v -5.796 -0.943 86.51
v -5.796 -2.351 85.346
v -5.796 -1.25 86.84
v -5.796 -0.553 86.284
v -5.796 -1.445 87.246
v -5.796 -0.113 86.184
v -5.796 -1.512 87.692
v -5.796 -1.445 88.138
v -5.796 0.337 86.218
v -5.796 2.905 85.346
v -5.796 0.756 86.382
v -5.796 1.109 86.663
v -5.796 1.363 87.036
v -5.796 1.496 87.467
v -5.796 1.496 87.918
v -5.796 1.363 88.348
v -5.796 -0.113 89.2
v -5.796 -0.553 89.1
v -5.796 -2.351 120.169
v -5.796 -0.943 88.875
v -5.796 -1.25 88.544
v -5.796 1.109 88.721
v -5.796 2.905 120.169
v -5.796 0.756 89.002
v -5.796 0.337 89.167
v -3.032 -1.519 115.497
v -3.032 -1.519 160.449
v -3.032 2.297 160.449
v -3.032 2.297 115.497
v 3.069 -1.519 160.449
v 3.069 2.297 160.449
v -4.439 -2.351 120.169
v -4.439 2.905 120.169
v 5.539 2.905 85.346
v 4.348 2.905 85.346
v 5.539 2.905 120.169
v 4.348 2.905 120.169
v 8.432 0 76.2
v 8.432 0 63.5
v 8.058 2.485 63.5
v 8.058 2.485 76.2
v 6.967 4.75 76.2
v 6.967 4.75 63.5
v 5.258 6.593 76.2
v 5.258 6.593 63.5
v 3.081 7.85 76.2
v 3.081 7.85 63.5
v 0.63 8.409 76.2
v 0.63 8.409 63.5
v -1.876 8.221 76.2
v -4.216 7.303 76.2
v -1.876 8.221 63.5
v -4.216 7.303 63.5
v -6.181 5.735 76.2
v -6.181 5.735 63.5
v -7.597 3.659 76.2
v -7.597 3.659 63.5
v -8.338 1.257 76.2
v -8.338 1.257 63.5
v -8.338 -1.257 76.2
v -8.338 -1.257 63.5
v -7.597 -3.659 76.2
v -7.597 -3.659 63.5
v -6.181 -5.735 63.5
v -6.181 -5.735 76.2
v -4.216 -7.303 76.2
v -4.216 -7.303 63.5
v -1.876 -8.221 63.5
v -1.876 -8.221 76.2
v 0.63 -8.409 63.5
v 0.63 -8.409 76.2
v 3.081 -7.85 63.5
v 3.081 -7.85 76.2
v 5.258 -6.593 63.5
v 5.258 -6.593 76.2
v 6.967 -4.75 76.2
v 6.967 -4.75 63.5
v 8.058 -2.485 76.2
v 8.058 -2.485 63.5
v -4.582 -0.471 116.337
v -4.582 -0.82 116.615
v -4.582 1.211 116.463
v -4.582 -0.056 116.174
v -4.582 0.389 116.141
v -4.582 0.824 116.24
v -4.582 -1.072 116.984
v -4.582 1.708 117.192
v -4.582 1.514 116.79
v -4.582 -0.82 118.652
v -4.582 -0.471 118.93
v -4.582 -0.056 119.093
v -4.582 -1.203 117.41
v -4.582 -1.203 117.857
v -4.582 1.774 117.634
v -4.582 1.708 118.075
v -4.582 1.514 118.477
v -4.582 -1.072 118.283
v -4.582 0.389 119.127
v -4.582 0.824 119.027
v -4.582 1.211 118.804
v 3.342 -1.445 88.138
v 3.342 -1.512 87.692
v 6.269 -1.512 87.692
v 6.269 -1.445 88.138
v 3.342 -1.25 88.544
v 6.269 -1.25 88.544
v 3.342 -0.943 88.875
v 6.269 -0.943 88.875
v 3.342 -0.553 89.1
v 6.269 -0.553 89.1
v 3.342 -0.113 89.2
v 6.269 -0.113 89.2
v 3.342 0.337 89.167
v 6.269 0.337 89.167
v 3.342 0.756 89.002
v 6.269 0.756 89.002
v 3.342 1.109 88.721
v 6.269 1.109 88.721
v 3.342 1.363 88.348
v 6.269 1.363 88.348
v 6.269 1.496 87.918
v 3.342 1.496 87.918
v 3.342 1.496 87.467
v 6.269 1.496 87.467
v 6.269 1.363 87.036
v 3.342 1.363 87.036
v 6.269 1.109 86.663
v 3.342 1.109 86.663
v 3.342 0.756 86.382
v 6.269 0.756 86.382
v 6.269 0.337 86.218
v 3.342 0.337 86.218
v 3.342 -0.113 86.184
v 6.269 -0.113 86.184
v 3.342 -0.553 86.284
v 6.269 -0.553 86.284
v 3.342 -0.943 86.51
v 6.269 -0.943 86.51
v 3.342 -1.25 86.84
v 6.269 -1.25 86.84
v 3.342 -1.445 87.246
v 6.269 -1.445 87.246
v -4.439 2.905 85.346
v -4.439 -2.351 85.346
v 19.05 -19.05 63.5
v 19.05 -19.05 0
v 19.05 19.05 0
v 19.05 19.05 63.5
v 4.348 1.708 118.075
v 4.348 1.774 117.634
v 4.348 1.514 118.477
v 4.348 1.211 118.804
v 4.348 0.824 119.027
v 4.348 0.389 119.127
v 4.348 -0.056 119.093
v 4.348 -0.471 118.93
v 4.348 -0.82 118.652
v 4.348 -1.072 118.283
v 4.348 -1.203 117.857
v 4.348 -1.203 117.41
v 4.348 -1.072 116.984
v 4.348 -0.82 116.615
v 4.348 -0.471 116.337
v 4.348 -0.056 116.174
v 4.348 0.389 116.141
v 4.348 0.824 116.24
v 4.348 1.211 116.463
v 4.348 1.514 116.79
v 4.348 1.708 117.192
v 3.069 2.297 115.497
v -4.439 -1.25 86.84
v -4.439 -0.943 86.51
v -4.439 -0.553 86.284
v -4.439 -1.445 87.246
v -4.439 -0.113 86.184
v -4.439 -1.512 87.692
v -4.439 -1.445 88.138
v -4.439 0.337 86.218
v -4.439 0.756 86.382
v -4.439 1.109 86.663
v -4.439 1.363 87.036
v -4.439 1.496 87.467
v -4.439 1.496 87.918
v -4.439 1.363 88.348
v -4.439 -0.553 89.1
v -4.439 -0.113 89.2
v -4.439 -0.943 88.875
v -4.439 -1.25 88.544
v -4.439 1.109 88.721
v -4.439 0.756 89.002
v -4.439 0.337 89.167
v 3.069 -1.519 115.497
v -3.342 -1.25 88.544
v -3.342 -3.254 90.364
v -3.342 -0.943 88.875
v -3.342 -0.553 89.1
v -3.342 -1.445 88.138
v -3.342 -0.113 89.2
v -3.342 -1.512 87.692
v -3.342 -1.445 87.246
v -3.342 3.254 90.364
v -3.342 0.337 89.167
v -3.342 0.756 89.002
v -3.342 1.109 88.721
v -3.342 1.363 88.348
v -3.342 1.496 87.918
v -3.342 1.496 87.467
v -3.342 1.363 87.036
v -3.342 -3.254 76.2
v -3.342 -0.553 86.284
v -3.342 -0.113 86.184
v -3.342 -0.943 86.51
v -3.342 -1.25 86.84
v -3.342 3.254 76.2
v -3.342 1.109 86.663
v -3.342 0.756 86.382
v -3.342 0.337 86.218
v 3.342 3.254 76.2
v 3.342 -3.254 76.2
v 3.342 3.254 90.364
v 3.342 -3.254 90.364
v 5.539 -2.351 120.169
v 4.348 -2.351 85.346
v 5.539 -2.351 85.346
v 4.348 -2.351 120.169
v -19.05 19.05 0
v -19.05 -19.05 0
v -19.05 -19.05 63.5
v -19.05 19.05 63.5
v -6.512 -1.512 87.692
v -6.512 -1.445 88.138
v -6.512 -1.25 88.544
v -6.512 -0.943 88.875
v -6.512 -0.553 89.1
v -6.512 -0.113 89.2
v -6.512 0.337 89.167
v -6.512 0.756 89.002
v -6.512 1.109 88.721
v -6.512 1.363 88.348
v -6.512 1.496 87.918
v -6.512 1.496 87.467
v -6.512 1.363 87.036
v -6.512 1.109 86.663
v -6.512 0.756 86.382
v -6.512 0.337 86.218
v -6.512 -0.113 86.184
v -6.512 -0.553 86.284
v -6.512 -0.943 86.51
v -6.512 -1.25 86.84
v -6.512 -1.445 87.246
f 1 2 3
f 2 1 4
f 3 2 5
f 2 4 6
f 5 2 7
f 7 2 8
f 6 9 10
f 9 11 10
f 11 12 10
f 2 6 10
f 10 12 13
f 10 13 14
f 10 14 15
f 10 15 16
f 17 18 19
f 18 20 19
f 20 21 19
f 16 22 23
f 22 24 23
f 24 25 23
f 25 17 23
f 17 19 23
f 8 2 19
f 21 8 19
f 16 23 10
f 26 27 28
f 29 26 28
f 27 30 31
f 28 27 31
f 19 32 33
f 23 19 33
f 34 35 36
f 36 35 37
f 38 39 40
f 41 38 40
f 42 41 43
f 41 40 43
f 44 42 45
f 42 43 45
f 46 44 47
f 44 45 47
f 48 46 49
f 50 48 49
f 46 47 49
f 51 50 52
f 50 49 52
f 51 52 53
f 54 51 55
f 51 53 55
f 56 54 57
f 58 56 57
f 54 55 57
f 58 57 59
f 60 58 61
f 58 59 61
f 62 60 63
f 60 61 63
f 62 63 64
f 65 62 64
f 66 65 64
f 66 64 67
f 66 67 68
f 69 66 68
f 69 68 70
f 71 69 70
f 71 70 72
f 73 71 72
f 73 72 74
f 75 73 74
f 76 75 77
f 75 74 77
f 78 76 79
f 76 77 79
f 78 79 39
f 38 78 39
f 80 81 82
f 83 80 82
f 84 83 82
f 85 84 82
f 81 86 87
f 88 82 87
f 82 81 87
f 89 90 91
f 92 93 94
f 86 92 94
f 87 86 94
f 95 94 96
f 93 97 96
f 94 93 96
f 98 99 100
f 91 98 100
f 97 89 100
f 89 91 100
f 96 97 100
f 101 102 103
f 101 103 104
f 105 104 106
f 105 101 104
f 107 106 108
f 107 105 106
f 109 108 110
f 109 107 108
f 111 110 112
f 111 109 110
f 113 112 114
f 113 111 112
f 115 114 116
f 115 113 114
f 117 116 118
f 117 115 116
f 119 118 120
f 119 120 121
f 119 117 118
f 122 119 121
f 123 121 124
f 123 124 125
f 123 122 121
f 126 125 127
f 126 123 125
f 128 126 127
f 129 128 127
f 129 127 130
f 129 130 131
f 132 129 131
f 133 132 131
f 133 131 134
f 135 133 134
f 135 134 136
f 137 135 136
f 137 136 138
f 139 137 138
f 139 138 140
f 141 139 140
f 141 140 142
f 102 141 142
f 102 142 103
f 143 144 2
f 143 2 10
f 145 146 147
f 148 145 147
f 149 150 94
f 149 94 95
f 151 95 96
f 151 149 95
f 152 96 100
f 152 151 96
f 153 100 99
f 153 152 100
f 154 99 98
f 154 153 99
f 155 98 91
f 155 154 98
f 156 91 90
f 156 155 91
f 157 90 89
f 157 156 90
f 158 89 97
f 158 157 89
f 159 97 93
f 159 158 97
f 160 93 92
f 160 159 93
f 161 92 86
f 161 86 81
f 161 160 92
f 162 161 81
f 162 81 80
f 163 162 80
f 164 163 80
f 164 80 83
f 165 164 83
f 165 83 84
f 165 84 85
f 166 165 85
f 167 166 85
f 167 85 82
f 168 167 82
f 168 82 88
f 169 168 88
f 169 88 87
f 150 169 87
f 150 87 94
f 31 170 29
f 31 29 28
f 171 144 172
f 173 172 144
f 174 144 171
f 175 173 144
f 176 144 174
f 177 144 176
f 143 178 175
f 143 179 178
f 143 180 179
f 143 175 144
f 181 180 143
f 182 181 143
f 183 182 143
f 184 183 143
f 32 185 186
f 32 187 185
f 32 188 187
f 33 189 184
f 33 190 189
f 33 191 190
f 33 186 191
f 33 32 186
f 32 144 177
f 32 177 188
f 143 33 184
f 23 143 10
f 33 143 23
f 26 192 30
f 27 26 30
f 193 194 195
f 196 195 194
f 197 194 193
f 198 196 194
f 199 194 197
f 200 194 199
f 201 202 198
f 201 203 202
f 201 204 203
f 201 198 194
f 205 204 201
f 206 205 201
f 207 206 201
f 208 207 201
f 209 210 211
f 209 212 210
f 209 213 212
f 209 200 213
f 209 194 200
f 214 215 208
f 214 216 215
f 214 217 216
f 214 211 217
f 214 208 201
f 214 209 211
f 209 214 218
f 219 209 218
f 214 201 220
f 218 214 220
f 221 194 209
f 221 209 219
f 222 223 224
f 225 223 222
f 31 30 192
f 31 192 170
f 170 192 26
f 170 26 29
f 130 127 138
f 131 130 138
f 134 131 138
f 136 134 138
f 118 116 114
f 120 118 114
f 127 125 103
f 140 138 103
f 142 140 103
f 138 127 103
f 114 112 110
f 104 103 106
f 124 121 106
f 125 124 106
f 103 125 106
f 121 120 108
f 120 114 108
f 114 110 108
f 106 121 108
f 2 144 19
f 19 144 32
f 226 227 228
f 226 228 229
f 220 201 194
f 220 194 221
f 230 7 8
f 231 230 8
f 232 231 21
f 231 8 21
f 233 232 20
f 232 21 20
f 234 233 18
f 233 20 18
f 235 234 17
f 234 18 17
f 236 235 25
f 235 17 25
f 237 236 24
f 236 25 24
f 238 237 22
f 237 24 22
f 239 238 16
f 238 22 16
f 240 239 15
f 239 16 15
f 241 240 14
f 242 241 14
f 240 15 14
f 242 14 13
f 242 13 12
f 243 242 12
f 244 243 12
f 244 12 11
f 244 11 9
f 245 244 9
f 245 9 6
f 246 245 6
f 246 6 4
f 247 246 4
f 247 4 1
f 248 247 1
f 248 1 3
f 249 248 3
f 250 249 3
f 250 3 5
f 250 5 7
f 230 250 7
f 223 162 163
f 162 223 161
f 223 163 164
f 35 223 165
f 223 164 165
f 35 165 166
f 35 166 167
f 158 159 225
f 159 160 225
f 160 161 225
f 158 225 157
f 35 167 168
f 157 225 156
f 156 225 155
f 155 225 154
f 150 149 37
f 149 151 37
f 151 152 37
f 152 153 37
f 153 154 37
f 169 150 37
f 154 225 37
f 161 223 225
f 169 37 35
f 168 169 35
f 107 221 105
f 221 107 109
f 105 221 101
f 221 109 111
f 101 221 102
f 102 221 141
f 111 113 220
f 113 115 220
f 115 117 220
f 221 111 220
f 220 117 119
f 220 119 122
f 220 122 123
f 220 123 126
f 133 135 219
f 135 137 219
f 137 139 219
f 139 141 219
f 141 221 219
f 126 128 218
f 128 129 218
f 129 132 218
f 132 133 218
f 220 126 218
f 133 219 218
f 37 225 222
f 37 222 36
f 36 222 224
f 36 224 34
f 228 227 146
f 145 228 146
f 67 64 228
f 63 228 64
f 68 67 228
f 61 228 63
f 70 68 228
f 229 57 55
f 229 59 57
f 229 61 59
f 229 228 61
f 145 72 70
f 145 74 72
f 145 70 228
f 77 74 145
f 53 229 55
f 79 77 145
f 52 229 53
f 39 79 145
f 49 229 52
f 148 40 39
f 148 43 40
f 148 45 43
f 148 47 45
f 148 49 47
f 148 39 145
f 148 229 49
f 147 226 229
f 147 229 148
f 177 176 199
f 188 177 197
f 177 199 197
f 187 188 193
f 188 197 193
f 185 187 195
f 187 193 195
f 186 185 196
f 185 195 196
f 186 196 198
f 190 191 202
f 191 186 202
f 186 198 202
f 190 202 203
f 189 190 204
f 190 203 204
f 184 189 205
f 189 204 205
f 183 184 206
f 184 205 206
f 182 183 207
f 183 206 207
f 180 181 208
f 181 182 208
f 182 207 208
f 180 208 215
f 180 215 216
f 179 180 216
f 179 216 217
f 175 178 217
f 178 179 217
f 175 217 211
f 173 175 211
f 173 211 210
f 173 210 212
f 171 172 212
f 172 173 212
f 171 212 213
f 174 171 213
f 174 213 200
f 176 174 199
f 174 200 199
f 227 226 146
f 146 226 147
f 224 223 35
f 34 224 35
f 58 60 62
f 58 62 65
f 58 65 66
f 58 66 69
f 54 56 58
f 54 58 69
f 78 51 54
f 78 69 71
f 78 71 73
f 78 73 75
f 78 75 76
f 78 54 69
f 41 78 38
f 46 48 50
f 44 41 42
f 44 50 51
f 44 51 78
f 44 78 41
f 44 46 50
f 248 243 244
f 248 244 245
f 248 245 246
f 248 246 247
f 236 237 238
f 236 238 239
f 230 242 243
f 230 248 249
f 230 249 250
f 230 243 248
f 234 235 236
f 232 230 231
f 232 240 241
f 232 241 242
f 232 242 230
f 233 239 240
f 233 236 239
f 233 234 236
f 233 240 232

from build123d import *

# Parameters (mm, degrees)
F0_W          = 38.1
F0_H          = 38.1
F1_DEPTH      = 63.5
F2_R          = 8.4324133864
F3_DEPTH      = 12.7
F4_W          = 6.6846627742
F4_H          = 6.5082404763
F5_DEPTH      = 14.1638647765
F6_R          = 1.5124454646
F7_DEPTH      = 3.1696904916
F7_DEPTH_BACK = 9.6108838916
F9_START      = 4.3480005115
F8_W          = 5.255397642
F8_H          = 34.8232388496
F9_DEPTH      = 1.1912947521
F10_START     = -4.4385781512
F10_DEPTH     = 1.3572052121
F11_R         = 1.4972465524
F12_DEPTH     = 10.1209655404
F14_START     = -2.470415784
F13_W         = 3.8161192788
F13_H         = 44.9524968863
F14_DEPTH     = 6.1012294609


with BuildPart() as f1:
    # F0 (on Top) → F1 (new body)
    with BuildSketch(Plane.XY):
        Rectangle(F0_W, F0_H)
    extrude(amount=F1_DEPTH)

    # F2 (on face) → F3 (join)
    with BuildSketch(Plane.XY.offset(63.5)):
        Circle(F2_R)
    extrude(amount=F3_DEPTH)


with BuildPart() as f5:
    # F4 (on face) → F5 (new body)
    with BuildSketch(Plane.XY.offset(76.2)):
        Rectangle(F4_W, F4_H)
    extrude(amount=F5_DEPTH)

    # F6 (on face) → F7 (join, two sides)
    with BuildSketch(Plane(origin=(-3.3423313871, 0, 0), x_dir=(0, -1, 0), z_dir=(-1, 0, 0))) as f7_sk:
        with Locations((0, 87.6921564341)):
            Circle(F6_R)
    extrude(amount=F7_DEPTH)
    extrude(f7_sk.sketch, amount=-F7_DEPTH_BACK)

    # F8 (on Right) → F10 (join)
    with BuildSketch(Plane.YZ.offset(F10_START)):
        with Locations((0.2771640429, 102.7572005987)):
            Rectangle(F8_W, F8_H)
    extrude(amount=-F10_DEPTH)


with BuildPart() as f9:
    # F8 (on Right) → F9 (new body)
    with BuildSketch(Plane.YZ.offset(F9_START)):
        with Locations((0.2771640429, 102.7572005987)):
            Rectangle(F8_W, F8_H)
    extrude(amount=F9_DEPTH)

    # F11 (on face) → F12 (join)
    with BuildSketch(Plane.YZ.offset(5.5392952636)):
        with Locations((0.2771640429, 117.6335960627)):
            Circle(F11_R)
    extrude(amount=-F12_DEPTH)


with BuildPart() as f14:
    # F13 (on face) → F14 (new body)
    with BuildSketch(Plane.YZ.offset(5.5392952636).offset(F14_START)):
        with Locations((0.3887154744, 137.9730328918)):
            Rectangle(F13_W, F13_H)
    extrude(amount=-F14_DEPTH)


solid = Compound([f1.part, f5.part, f9.part, f14.part])
